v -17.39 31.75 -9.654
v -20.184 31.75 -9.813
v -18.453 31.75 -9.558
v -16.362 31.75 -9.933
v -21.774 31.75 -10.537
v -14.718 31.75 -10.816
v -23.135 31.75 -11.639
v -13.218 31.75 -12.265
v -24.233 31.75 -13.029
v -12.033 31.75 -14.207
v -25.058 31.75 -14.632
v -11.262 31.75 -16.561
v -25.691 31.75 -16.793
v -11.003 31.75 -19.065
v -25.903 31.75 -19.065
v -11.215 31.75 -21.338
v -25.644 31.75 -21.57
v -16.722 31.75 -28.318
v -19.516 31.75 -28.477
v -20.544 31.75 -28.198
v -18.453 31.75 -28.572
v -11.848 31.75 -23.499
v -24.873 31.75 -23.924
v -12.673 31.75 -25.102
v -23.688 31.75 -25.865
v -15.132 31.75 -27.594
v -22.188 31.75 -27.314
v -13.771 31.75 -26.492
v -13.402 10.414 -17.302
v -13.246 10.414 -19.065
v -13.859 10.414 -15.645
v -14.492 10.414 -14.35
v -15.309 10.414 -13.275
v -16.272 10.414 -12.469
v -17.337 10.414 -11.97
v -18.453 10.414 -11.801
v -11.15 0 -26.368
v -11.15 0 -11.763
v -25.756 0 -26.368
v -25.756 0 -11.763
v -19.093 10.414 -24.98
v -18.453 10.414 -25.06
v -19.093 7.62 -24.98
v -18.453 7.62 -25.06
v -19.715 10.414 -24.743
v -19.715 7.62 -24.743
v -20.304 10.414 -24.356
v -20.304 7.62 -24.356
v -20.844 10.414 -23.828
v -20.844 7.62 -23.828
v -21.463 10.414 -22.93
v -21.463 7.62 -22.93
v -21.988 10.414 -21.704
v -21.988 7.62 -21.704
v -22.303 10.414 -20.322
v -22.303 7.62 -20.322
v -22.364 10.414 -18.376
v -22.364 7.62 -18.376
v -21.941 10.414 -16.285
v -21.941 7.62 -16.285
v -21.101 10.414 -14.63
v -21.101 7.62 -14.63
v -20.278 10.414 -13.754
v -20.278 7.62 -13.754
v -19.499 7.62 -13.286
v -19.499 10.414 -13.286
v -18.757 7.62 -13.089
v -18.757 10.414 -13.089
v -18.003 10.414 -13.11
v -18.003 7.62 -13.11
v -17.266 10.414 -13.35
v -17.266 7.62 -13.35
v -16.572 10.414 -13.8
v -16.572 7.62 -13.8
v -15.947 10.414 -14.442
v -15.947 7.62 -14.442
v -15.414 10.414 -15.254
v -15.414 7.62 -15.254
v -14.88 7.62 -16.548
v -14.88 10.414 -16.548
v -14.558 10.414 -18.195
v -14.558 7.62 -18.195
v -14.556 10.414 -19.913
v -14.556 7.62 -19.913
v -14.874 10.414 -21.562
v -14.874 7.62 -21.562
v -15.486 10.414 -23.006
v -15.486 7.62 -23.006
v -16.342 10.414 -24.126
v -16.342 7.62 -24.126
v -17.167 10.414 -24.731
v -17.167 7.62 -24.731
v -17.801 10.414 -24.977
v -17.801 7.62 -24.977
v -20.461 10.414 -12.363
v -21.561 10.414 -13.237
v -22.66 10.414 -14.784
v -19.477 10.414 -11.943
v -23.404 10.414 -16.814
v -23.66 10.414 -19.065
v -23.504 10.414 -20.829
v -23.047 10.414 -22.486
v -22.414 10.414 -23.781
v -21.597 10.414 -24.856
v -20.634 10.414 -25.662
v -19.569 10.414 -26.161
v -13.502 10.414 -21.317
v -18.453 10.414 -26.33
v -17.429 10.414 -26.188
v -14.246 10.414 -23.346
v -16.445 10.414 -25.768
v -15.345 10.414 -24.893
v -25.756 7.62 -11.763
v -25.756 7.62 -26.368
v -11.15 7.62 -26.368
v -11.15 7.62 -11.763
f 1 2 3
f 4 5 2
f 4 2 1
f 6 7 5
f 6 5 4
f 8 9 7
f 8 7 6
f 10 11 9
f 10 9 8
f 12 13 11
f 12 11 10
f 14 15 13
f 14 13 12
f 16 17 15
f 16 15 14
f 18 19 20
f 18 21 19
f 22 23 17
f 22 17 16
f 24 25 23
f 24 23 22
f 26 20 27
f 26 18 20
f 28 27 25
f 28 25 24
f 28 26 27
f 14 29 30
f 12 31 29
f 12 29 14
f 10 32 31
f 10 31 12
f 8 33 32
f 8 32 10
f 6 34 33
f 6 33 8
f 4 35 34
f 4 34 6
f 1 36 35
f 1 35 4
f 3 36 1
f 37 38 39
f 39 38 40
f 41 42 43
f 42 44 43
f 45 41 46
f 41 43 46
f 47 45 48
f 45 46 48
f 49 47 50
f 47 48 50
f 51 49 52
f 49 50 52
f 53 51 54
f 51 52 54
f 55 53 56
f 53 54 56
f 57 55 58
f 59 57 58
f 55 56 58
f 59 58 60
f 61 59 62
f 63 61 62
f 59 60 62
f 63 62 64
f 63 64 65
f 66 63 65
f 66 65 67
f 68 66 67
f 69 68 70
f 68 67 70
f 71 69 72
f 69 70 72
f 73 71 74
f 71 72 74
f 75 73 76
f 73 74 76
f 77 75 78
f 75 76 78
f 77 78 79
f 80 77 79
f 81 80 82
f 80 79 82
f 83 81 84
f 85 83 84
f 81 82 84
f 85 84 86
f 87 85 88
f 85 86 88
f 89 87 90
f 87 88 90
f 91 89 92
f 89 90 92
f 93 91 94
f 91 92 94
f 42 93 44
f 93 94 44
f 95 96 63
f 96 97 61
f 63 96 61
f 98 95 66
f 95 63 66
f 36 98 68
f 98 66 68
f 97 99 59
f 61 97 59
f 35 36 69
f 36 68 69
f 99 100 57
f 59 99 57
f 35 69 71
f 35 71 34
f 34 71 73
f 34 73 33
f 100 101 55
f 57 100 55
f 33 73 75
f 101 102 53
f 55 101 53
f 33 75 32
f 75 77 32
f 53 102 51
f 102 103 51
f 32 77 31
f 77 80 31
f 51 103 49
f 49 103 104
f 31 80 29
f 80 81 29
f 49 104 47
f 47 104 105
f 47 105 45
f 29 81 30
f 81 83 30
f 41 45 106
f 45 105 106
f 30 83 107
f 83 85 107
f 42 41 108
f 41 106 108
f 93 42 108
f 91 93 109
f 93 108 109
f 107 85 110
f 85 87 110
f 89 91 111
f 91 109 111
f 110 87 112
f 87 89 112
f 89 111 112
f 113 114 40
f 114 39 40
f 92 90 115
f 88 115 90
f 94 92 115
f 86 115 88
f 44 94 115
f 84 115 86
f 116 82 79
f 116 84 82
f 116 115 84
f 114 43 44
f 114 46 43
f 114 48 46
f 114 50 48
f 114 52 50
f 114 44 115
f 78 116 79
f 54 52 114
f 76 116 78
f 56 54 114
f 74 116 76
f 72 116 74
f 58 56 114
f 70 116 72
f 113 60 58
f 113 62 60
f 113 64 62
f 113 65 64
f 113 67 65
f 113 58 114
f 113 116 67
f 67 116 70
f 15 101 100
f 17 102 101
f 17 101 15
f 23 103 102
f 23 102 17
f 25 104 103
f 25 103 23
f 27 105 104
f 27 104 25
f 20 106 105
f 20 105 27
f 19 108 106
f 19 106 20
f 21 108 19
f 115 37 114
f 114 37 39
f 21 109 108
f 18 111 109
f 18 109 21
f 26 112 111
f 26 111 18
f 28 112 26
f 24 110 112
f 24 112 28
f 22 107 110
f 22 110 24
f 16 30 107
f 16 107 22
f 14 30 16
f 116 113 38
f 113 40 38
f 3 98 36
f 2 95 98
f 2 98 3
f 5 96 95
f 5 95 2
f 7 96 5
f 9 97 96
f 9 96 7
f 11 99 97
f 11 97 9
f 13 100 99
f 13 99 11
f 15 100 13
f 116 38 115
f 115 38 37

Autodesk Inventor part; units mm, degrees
ref_plane "YZ Plane" through (0, 0, 0) normal (1, 0, 0) x (0, 1, 0)
ref_plane "XZ Plane" through (0, 0, 0) normal (0, 1, 0) x (-1, 0, 0)
ref_plane "XY Plane" through (0, 0, 0) normal (0, 0, 1) x (1, 0, 0)
sketch "Sketch2" plane through (0, 0, 0) normal (0, 1, 0) x (-1, 0, 0)
  line L0 (25.7555, -11.7629) -> (11.1505, -11.7629)
  line L1 (11.1505, -11.7629) -> (11.1505, -26.3679)
  line L2 (11.1505, -26.3679) -> (25.7555, -26.3679)
  line L3 (25.7555, -26.3679) -> (25.7555, -11.7629)
  point P0 (0, 0)
  dimension "d0" = 14.605
  dimension "d1" = 14.605
extrude "Extrusion1" add sketch "Sketch2" along normal blind 7.62
sketch "Sketch3" plane through (0, 7.62, 0) normal (0, 1, 0) x (1, 0, 0)
  ellipse E0 centre (-18.453, 19.0654) end of major axis (-18.453, 25.0598) minor radius 3.937
  ellipse E1 centre (-18.453, 19.0654) end of major axis (-18.453, 26.3298) minor radius 5.207
  point P0 (0, 0)
  dimension "d13" = 5.9944
  dimension "d14" = 3.937
  dimension "d15" = 5.207
  dimension "d16" = 7.2644
extrude "Extrusion3" add sketch "Sketch3" along normal blind 2.794 contours E0
sketch "Sketch6" plane through (0, 10.414, 0) normal (0, 1, 0) x (1, 0, 0)
  ellipse E0 centre (-18.453, 19.0654) end of major axis (-18.453, 26.3298) minor radius 5.207 projected
  ellipse E1 centre (-18.453, 19.0654) end of major axis (-18.453, 13.071) minor radius 3.937 projected
  ellipse E2 centre (-18.453, 19.0654) end of major axis (-18.453, 26.3298) minor radius 5.207
  point P0 (0, 0)
extrude "Extrusion4" add sketch "Sketch6" along normal blind 21.336 draft 6 contours E0 | E1
ref_plane "Work Plane2" through (-18.453, 0, -11.7629) normal (1, 0, 0) x (0, 0, -1)
sketch "Sketch9" plane through (-18.453, 0, -11.7629) normal (1, 0, 0) x (0, 0, -1)
  arc A0 (23.2608, 28.3606) -> (-8.4979, 28.3606) centre (7.3815, 6.1892) ccw
  line L0 (-8.4979, 28.3606) -> (23.2608, 28.3606)
  line L1 (23.2608, 28.3606) -> (14.605, 0)
  line L2 (14.605, 0) -> (0, 0)
  line L3 (14.605, 0) -> (0, 0) projected
  line L4 (0, 0) -> (-8.4979, 28.3606)
  point P0 (-11.7629, 0)
properties part number "MalePassengerTL"
